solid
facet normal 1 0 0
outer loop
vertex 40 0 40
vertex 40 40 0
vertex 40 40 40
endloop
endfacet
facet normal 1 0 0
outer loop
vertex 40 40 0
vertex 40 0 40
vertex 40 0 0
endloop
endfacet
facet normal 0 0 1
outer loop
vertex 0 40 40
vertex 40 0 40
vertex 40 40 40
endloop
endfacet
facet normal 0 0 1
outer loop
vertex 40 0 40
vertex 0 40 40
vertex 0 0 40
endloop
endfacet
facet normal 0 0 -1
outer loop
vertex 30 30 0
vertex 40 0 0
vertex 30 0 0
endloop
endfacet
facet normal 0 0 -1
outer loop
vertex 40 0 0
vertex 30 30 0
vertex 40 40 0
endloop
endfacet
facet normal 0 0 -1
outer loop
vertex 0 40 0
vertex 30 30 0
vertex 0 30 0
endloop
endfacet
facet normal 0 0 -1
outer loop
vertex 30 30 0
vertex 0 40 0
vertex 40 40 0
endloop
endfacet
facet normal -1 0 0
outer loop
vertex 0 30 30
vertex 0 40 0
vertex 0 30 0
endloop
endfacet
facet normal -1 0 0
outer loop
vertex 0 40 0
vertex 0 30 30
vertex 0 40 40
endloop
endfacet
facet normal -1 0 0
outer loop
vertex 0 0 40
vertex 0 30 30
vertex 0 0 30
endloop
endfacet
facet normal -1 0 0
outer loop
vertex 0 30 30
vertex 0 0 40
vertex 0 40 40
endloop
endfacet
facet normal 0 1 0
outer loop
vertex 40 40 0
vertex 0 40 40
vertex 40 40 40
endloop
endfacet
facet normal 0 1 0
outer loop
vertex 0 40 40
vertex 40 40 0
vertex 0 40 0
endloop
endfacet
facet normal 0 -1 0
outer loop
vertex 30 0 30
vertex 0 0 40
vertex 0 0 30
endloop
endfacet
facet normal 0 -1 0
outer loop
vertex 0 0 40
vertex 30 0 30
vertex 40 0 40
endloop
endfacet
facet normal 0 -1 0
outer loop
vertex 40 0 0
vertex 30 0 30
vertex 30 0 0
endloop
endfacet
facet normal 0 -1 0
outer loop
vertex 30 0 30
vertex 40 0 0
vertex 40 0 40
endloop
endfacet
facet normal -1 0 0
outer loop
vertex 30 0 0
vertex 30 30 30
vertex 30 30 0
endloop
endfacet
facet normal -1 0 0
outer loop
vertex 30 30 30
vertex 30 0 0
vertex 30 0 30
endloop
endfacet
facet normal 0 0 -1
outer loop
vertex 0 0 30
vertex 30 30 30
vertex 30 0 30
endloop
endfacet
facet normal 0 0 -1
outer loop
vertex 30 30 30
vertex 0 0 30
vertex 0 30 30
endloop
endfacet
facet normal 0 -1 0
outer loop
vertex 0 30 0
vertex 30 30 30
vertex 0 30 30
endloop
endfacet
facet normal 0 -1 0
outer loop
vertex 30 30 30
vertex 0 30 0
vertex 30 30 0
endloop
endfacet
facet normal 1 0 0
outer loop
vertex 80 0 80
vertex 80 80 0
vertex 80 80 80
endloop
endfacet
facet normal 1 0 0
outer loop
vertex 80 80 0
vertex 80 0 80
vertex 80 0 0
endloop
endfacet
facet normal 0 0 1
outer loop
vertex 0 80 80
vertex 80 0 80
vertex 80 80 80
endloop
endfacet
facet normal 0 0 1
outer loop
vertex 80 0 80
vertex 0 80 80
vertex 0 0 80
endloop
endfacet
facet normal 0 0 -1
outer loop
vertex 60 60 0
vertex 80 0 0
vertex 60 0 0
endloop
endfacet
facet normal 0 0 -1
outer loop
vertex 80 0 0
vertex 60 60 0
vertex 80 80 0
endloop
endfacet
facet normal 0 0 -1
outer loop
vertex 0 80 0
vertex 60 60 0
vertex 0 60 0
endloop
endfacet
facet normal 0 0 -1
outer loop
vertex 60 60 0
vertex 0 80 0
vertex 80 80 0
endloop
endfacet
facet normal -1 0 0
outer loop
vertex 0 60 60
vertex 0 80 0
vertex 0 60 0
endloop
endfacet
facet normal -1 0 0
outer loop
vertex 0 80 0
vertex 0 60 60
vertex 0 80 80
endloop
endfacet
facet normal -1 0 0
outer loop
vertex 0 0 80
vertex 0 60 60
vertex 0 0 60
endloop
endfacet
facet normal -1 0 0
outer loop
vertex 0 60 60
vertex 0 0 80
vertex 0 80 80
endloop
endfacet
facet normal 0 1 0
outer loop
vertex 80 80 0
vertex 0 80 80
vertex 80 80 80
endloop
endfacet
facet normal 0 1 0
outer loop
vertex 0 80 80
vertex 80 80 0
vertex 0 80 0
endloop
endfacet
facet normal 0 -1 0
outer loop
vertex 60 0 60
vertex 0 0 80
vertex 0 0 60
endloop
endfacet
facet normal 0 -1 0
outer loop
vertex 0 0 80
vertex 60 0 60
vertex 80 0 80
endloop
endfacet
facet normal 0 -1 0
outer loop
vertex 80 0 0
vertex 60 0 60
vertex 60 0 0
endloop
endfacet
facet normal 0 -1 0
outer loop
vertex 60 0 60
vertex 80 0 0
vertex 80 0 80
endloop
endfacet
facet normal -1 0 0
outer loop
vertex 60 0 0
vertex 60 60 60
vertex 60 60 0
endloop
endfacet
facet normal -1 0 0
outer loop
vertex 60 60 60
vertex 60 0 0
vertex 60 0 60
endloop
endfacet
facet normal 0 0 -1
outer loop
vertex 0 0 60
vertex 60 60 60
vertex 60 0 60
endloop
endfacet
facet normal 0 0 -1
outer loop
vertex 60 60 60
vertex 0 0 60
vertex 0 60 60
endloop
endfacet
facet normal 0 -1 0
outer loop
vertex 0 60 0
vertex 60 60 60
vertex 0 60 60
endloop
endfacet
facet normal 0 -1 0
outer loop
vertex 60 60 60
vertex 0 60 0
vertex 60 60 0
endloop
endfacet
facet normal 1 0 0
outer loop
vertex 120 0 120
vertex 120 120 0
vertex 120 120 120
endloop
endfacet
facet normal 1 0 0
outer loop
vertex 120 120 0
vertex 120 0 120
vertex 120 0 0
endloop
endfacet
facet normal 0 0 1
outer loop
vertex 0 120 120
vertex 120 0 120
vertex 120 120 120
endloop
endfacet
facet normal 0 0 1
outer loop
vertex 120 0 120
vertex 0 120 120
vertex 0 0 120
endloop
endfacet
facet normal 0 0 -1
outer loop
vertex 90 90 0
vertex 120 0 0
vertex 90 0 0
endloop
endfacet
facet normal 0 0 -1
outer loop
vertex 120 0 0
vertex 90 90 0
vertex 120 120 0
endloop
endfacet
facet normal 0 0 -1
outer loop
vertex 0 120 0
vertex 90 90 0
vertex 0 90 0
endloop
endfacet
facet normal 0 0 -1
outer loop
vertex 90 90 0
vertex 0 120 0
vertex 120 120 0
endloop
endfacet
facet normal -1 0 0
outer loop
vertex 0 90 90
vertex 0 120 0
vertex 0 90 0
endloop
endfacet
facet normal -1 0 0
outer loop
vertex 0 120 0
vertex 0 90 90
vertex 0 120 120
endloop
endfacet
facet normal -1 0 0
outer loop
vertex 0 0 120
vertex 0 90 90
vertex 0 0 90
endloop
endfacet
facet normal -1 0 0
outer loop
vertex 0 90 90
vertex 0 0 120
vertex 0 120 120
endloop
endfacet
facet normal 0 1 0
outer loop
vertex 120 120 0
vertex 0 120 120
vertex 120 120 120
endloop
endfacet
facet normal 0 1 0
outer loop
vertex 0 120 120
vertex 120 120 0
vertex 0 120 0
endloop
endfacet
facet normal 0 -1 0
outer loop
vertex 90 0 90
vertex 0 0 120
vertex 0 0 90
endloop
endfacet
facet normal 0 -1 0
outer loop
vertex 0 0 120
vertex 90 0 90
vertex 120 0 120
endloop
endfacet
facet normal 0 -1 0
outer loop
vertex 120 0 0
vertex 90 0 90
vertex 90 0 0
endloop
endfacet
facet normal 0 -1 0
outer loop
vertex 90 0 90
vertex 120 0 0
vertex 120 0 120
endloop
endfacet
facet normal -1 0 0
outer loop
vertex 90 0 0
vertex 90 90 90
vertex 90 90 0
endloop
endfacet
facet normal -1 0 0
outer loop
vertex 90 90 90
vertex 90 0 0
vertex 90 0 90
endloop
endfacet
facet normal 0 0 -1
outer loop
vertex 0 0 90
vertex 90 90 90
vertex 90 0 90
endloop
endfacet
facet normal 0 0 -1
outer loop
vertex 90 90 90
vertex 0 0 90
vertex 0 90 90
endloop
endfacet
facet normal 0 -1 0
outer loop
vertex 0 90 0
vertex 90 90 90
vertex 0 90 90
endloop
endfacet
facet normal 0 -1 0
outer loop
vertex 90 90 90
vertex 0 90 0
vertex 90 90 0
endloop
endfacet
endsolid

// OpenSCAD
difference()  {
    cube([40*1, 40*1, 40*1]);
    cube([30*1, 30*1, 30*1]);
}
difference()  {
    cube([40*2, 40*2, 40*2]);
    cube([30*2, 30*2, 30*2]);
}
difference()  {
    cube([40*3, 40*3, 40*3]);
    cube([30*3, 30*3, 30*3]);
}
